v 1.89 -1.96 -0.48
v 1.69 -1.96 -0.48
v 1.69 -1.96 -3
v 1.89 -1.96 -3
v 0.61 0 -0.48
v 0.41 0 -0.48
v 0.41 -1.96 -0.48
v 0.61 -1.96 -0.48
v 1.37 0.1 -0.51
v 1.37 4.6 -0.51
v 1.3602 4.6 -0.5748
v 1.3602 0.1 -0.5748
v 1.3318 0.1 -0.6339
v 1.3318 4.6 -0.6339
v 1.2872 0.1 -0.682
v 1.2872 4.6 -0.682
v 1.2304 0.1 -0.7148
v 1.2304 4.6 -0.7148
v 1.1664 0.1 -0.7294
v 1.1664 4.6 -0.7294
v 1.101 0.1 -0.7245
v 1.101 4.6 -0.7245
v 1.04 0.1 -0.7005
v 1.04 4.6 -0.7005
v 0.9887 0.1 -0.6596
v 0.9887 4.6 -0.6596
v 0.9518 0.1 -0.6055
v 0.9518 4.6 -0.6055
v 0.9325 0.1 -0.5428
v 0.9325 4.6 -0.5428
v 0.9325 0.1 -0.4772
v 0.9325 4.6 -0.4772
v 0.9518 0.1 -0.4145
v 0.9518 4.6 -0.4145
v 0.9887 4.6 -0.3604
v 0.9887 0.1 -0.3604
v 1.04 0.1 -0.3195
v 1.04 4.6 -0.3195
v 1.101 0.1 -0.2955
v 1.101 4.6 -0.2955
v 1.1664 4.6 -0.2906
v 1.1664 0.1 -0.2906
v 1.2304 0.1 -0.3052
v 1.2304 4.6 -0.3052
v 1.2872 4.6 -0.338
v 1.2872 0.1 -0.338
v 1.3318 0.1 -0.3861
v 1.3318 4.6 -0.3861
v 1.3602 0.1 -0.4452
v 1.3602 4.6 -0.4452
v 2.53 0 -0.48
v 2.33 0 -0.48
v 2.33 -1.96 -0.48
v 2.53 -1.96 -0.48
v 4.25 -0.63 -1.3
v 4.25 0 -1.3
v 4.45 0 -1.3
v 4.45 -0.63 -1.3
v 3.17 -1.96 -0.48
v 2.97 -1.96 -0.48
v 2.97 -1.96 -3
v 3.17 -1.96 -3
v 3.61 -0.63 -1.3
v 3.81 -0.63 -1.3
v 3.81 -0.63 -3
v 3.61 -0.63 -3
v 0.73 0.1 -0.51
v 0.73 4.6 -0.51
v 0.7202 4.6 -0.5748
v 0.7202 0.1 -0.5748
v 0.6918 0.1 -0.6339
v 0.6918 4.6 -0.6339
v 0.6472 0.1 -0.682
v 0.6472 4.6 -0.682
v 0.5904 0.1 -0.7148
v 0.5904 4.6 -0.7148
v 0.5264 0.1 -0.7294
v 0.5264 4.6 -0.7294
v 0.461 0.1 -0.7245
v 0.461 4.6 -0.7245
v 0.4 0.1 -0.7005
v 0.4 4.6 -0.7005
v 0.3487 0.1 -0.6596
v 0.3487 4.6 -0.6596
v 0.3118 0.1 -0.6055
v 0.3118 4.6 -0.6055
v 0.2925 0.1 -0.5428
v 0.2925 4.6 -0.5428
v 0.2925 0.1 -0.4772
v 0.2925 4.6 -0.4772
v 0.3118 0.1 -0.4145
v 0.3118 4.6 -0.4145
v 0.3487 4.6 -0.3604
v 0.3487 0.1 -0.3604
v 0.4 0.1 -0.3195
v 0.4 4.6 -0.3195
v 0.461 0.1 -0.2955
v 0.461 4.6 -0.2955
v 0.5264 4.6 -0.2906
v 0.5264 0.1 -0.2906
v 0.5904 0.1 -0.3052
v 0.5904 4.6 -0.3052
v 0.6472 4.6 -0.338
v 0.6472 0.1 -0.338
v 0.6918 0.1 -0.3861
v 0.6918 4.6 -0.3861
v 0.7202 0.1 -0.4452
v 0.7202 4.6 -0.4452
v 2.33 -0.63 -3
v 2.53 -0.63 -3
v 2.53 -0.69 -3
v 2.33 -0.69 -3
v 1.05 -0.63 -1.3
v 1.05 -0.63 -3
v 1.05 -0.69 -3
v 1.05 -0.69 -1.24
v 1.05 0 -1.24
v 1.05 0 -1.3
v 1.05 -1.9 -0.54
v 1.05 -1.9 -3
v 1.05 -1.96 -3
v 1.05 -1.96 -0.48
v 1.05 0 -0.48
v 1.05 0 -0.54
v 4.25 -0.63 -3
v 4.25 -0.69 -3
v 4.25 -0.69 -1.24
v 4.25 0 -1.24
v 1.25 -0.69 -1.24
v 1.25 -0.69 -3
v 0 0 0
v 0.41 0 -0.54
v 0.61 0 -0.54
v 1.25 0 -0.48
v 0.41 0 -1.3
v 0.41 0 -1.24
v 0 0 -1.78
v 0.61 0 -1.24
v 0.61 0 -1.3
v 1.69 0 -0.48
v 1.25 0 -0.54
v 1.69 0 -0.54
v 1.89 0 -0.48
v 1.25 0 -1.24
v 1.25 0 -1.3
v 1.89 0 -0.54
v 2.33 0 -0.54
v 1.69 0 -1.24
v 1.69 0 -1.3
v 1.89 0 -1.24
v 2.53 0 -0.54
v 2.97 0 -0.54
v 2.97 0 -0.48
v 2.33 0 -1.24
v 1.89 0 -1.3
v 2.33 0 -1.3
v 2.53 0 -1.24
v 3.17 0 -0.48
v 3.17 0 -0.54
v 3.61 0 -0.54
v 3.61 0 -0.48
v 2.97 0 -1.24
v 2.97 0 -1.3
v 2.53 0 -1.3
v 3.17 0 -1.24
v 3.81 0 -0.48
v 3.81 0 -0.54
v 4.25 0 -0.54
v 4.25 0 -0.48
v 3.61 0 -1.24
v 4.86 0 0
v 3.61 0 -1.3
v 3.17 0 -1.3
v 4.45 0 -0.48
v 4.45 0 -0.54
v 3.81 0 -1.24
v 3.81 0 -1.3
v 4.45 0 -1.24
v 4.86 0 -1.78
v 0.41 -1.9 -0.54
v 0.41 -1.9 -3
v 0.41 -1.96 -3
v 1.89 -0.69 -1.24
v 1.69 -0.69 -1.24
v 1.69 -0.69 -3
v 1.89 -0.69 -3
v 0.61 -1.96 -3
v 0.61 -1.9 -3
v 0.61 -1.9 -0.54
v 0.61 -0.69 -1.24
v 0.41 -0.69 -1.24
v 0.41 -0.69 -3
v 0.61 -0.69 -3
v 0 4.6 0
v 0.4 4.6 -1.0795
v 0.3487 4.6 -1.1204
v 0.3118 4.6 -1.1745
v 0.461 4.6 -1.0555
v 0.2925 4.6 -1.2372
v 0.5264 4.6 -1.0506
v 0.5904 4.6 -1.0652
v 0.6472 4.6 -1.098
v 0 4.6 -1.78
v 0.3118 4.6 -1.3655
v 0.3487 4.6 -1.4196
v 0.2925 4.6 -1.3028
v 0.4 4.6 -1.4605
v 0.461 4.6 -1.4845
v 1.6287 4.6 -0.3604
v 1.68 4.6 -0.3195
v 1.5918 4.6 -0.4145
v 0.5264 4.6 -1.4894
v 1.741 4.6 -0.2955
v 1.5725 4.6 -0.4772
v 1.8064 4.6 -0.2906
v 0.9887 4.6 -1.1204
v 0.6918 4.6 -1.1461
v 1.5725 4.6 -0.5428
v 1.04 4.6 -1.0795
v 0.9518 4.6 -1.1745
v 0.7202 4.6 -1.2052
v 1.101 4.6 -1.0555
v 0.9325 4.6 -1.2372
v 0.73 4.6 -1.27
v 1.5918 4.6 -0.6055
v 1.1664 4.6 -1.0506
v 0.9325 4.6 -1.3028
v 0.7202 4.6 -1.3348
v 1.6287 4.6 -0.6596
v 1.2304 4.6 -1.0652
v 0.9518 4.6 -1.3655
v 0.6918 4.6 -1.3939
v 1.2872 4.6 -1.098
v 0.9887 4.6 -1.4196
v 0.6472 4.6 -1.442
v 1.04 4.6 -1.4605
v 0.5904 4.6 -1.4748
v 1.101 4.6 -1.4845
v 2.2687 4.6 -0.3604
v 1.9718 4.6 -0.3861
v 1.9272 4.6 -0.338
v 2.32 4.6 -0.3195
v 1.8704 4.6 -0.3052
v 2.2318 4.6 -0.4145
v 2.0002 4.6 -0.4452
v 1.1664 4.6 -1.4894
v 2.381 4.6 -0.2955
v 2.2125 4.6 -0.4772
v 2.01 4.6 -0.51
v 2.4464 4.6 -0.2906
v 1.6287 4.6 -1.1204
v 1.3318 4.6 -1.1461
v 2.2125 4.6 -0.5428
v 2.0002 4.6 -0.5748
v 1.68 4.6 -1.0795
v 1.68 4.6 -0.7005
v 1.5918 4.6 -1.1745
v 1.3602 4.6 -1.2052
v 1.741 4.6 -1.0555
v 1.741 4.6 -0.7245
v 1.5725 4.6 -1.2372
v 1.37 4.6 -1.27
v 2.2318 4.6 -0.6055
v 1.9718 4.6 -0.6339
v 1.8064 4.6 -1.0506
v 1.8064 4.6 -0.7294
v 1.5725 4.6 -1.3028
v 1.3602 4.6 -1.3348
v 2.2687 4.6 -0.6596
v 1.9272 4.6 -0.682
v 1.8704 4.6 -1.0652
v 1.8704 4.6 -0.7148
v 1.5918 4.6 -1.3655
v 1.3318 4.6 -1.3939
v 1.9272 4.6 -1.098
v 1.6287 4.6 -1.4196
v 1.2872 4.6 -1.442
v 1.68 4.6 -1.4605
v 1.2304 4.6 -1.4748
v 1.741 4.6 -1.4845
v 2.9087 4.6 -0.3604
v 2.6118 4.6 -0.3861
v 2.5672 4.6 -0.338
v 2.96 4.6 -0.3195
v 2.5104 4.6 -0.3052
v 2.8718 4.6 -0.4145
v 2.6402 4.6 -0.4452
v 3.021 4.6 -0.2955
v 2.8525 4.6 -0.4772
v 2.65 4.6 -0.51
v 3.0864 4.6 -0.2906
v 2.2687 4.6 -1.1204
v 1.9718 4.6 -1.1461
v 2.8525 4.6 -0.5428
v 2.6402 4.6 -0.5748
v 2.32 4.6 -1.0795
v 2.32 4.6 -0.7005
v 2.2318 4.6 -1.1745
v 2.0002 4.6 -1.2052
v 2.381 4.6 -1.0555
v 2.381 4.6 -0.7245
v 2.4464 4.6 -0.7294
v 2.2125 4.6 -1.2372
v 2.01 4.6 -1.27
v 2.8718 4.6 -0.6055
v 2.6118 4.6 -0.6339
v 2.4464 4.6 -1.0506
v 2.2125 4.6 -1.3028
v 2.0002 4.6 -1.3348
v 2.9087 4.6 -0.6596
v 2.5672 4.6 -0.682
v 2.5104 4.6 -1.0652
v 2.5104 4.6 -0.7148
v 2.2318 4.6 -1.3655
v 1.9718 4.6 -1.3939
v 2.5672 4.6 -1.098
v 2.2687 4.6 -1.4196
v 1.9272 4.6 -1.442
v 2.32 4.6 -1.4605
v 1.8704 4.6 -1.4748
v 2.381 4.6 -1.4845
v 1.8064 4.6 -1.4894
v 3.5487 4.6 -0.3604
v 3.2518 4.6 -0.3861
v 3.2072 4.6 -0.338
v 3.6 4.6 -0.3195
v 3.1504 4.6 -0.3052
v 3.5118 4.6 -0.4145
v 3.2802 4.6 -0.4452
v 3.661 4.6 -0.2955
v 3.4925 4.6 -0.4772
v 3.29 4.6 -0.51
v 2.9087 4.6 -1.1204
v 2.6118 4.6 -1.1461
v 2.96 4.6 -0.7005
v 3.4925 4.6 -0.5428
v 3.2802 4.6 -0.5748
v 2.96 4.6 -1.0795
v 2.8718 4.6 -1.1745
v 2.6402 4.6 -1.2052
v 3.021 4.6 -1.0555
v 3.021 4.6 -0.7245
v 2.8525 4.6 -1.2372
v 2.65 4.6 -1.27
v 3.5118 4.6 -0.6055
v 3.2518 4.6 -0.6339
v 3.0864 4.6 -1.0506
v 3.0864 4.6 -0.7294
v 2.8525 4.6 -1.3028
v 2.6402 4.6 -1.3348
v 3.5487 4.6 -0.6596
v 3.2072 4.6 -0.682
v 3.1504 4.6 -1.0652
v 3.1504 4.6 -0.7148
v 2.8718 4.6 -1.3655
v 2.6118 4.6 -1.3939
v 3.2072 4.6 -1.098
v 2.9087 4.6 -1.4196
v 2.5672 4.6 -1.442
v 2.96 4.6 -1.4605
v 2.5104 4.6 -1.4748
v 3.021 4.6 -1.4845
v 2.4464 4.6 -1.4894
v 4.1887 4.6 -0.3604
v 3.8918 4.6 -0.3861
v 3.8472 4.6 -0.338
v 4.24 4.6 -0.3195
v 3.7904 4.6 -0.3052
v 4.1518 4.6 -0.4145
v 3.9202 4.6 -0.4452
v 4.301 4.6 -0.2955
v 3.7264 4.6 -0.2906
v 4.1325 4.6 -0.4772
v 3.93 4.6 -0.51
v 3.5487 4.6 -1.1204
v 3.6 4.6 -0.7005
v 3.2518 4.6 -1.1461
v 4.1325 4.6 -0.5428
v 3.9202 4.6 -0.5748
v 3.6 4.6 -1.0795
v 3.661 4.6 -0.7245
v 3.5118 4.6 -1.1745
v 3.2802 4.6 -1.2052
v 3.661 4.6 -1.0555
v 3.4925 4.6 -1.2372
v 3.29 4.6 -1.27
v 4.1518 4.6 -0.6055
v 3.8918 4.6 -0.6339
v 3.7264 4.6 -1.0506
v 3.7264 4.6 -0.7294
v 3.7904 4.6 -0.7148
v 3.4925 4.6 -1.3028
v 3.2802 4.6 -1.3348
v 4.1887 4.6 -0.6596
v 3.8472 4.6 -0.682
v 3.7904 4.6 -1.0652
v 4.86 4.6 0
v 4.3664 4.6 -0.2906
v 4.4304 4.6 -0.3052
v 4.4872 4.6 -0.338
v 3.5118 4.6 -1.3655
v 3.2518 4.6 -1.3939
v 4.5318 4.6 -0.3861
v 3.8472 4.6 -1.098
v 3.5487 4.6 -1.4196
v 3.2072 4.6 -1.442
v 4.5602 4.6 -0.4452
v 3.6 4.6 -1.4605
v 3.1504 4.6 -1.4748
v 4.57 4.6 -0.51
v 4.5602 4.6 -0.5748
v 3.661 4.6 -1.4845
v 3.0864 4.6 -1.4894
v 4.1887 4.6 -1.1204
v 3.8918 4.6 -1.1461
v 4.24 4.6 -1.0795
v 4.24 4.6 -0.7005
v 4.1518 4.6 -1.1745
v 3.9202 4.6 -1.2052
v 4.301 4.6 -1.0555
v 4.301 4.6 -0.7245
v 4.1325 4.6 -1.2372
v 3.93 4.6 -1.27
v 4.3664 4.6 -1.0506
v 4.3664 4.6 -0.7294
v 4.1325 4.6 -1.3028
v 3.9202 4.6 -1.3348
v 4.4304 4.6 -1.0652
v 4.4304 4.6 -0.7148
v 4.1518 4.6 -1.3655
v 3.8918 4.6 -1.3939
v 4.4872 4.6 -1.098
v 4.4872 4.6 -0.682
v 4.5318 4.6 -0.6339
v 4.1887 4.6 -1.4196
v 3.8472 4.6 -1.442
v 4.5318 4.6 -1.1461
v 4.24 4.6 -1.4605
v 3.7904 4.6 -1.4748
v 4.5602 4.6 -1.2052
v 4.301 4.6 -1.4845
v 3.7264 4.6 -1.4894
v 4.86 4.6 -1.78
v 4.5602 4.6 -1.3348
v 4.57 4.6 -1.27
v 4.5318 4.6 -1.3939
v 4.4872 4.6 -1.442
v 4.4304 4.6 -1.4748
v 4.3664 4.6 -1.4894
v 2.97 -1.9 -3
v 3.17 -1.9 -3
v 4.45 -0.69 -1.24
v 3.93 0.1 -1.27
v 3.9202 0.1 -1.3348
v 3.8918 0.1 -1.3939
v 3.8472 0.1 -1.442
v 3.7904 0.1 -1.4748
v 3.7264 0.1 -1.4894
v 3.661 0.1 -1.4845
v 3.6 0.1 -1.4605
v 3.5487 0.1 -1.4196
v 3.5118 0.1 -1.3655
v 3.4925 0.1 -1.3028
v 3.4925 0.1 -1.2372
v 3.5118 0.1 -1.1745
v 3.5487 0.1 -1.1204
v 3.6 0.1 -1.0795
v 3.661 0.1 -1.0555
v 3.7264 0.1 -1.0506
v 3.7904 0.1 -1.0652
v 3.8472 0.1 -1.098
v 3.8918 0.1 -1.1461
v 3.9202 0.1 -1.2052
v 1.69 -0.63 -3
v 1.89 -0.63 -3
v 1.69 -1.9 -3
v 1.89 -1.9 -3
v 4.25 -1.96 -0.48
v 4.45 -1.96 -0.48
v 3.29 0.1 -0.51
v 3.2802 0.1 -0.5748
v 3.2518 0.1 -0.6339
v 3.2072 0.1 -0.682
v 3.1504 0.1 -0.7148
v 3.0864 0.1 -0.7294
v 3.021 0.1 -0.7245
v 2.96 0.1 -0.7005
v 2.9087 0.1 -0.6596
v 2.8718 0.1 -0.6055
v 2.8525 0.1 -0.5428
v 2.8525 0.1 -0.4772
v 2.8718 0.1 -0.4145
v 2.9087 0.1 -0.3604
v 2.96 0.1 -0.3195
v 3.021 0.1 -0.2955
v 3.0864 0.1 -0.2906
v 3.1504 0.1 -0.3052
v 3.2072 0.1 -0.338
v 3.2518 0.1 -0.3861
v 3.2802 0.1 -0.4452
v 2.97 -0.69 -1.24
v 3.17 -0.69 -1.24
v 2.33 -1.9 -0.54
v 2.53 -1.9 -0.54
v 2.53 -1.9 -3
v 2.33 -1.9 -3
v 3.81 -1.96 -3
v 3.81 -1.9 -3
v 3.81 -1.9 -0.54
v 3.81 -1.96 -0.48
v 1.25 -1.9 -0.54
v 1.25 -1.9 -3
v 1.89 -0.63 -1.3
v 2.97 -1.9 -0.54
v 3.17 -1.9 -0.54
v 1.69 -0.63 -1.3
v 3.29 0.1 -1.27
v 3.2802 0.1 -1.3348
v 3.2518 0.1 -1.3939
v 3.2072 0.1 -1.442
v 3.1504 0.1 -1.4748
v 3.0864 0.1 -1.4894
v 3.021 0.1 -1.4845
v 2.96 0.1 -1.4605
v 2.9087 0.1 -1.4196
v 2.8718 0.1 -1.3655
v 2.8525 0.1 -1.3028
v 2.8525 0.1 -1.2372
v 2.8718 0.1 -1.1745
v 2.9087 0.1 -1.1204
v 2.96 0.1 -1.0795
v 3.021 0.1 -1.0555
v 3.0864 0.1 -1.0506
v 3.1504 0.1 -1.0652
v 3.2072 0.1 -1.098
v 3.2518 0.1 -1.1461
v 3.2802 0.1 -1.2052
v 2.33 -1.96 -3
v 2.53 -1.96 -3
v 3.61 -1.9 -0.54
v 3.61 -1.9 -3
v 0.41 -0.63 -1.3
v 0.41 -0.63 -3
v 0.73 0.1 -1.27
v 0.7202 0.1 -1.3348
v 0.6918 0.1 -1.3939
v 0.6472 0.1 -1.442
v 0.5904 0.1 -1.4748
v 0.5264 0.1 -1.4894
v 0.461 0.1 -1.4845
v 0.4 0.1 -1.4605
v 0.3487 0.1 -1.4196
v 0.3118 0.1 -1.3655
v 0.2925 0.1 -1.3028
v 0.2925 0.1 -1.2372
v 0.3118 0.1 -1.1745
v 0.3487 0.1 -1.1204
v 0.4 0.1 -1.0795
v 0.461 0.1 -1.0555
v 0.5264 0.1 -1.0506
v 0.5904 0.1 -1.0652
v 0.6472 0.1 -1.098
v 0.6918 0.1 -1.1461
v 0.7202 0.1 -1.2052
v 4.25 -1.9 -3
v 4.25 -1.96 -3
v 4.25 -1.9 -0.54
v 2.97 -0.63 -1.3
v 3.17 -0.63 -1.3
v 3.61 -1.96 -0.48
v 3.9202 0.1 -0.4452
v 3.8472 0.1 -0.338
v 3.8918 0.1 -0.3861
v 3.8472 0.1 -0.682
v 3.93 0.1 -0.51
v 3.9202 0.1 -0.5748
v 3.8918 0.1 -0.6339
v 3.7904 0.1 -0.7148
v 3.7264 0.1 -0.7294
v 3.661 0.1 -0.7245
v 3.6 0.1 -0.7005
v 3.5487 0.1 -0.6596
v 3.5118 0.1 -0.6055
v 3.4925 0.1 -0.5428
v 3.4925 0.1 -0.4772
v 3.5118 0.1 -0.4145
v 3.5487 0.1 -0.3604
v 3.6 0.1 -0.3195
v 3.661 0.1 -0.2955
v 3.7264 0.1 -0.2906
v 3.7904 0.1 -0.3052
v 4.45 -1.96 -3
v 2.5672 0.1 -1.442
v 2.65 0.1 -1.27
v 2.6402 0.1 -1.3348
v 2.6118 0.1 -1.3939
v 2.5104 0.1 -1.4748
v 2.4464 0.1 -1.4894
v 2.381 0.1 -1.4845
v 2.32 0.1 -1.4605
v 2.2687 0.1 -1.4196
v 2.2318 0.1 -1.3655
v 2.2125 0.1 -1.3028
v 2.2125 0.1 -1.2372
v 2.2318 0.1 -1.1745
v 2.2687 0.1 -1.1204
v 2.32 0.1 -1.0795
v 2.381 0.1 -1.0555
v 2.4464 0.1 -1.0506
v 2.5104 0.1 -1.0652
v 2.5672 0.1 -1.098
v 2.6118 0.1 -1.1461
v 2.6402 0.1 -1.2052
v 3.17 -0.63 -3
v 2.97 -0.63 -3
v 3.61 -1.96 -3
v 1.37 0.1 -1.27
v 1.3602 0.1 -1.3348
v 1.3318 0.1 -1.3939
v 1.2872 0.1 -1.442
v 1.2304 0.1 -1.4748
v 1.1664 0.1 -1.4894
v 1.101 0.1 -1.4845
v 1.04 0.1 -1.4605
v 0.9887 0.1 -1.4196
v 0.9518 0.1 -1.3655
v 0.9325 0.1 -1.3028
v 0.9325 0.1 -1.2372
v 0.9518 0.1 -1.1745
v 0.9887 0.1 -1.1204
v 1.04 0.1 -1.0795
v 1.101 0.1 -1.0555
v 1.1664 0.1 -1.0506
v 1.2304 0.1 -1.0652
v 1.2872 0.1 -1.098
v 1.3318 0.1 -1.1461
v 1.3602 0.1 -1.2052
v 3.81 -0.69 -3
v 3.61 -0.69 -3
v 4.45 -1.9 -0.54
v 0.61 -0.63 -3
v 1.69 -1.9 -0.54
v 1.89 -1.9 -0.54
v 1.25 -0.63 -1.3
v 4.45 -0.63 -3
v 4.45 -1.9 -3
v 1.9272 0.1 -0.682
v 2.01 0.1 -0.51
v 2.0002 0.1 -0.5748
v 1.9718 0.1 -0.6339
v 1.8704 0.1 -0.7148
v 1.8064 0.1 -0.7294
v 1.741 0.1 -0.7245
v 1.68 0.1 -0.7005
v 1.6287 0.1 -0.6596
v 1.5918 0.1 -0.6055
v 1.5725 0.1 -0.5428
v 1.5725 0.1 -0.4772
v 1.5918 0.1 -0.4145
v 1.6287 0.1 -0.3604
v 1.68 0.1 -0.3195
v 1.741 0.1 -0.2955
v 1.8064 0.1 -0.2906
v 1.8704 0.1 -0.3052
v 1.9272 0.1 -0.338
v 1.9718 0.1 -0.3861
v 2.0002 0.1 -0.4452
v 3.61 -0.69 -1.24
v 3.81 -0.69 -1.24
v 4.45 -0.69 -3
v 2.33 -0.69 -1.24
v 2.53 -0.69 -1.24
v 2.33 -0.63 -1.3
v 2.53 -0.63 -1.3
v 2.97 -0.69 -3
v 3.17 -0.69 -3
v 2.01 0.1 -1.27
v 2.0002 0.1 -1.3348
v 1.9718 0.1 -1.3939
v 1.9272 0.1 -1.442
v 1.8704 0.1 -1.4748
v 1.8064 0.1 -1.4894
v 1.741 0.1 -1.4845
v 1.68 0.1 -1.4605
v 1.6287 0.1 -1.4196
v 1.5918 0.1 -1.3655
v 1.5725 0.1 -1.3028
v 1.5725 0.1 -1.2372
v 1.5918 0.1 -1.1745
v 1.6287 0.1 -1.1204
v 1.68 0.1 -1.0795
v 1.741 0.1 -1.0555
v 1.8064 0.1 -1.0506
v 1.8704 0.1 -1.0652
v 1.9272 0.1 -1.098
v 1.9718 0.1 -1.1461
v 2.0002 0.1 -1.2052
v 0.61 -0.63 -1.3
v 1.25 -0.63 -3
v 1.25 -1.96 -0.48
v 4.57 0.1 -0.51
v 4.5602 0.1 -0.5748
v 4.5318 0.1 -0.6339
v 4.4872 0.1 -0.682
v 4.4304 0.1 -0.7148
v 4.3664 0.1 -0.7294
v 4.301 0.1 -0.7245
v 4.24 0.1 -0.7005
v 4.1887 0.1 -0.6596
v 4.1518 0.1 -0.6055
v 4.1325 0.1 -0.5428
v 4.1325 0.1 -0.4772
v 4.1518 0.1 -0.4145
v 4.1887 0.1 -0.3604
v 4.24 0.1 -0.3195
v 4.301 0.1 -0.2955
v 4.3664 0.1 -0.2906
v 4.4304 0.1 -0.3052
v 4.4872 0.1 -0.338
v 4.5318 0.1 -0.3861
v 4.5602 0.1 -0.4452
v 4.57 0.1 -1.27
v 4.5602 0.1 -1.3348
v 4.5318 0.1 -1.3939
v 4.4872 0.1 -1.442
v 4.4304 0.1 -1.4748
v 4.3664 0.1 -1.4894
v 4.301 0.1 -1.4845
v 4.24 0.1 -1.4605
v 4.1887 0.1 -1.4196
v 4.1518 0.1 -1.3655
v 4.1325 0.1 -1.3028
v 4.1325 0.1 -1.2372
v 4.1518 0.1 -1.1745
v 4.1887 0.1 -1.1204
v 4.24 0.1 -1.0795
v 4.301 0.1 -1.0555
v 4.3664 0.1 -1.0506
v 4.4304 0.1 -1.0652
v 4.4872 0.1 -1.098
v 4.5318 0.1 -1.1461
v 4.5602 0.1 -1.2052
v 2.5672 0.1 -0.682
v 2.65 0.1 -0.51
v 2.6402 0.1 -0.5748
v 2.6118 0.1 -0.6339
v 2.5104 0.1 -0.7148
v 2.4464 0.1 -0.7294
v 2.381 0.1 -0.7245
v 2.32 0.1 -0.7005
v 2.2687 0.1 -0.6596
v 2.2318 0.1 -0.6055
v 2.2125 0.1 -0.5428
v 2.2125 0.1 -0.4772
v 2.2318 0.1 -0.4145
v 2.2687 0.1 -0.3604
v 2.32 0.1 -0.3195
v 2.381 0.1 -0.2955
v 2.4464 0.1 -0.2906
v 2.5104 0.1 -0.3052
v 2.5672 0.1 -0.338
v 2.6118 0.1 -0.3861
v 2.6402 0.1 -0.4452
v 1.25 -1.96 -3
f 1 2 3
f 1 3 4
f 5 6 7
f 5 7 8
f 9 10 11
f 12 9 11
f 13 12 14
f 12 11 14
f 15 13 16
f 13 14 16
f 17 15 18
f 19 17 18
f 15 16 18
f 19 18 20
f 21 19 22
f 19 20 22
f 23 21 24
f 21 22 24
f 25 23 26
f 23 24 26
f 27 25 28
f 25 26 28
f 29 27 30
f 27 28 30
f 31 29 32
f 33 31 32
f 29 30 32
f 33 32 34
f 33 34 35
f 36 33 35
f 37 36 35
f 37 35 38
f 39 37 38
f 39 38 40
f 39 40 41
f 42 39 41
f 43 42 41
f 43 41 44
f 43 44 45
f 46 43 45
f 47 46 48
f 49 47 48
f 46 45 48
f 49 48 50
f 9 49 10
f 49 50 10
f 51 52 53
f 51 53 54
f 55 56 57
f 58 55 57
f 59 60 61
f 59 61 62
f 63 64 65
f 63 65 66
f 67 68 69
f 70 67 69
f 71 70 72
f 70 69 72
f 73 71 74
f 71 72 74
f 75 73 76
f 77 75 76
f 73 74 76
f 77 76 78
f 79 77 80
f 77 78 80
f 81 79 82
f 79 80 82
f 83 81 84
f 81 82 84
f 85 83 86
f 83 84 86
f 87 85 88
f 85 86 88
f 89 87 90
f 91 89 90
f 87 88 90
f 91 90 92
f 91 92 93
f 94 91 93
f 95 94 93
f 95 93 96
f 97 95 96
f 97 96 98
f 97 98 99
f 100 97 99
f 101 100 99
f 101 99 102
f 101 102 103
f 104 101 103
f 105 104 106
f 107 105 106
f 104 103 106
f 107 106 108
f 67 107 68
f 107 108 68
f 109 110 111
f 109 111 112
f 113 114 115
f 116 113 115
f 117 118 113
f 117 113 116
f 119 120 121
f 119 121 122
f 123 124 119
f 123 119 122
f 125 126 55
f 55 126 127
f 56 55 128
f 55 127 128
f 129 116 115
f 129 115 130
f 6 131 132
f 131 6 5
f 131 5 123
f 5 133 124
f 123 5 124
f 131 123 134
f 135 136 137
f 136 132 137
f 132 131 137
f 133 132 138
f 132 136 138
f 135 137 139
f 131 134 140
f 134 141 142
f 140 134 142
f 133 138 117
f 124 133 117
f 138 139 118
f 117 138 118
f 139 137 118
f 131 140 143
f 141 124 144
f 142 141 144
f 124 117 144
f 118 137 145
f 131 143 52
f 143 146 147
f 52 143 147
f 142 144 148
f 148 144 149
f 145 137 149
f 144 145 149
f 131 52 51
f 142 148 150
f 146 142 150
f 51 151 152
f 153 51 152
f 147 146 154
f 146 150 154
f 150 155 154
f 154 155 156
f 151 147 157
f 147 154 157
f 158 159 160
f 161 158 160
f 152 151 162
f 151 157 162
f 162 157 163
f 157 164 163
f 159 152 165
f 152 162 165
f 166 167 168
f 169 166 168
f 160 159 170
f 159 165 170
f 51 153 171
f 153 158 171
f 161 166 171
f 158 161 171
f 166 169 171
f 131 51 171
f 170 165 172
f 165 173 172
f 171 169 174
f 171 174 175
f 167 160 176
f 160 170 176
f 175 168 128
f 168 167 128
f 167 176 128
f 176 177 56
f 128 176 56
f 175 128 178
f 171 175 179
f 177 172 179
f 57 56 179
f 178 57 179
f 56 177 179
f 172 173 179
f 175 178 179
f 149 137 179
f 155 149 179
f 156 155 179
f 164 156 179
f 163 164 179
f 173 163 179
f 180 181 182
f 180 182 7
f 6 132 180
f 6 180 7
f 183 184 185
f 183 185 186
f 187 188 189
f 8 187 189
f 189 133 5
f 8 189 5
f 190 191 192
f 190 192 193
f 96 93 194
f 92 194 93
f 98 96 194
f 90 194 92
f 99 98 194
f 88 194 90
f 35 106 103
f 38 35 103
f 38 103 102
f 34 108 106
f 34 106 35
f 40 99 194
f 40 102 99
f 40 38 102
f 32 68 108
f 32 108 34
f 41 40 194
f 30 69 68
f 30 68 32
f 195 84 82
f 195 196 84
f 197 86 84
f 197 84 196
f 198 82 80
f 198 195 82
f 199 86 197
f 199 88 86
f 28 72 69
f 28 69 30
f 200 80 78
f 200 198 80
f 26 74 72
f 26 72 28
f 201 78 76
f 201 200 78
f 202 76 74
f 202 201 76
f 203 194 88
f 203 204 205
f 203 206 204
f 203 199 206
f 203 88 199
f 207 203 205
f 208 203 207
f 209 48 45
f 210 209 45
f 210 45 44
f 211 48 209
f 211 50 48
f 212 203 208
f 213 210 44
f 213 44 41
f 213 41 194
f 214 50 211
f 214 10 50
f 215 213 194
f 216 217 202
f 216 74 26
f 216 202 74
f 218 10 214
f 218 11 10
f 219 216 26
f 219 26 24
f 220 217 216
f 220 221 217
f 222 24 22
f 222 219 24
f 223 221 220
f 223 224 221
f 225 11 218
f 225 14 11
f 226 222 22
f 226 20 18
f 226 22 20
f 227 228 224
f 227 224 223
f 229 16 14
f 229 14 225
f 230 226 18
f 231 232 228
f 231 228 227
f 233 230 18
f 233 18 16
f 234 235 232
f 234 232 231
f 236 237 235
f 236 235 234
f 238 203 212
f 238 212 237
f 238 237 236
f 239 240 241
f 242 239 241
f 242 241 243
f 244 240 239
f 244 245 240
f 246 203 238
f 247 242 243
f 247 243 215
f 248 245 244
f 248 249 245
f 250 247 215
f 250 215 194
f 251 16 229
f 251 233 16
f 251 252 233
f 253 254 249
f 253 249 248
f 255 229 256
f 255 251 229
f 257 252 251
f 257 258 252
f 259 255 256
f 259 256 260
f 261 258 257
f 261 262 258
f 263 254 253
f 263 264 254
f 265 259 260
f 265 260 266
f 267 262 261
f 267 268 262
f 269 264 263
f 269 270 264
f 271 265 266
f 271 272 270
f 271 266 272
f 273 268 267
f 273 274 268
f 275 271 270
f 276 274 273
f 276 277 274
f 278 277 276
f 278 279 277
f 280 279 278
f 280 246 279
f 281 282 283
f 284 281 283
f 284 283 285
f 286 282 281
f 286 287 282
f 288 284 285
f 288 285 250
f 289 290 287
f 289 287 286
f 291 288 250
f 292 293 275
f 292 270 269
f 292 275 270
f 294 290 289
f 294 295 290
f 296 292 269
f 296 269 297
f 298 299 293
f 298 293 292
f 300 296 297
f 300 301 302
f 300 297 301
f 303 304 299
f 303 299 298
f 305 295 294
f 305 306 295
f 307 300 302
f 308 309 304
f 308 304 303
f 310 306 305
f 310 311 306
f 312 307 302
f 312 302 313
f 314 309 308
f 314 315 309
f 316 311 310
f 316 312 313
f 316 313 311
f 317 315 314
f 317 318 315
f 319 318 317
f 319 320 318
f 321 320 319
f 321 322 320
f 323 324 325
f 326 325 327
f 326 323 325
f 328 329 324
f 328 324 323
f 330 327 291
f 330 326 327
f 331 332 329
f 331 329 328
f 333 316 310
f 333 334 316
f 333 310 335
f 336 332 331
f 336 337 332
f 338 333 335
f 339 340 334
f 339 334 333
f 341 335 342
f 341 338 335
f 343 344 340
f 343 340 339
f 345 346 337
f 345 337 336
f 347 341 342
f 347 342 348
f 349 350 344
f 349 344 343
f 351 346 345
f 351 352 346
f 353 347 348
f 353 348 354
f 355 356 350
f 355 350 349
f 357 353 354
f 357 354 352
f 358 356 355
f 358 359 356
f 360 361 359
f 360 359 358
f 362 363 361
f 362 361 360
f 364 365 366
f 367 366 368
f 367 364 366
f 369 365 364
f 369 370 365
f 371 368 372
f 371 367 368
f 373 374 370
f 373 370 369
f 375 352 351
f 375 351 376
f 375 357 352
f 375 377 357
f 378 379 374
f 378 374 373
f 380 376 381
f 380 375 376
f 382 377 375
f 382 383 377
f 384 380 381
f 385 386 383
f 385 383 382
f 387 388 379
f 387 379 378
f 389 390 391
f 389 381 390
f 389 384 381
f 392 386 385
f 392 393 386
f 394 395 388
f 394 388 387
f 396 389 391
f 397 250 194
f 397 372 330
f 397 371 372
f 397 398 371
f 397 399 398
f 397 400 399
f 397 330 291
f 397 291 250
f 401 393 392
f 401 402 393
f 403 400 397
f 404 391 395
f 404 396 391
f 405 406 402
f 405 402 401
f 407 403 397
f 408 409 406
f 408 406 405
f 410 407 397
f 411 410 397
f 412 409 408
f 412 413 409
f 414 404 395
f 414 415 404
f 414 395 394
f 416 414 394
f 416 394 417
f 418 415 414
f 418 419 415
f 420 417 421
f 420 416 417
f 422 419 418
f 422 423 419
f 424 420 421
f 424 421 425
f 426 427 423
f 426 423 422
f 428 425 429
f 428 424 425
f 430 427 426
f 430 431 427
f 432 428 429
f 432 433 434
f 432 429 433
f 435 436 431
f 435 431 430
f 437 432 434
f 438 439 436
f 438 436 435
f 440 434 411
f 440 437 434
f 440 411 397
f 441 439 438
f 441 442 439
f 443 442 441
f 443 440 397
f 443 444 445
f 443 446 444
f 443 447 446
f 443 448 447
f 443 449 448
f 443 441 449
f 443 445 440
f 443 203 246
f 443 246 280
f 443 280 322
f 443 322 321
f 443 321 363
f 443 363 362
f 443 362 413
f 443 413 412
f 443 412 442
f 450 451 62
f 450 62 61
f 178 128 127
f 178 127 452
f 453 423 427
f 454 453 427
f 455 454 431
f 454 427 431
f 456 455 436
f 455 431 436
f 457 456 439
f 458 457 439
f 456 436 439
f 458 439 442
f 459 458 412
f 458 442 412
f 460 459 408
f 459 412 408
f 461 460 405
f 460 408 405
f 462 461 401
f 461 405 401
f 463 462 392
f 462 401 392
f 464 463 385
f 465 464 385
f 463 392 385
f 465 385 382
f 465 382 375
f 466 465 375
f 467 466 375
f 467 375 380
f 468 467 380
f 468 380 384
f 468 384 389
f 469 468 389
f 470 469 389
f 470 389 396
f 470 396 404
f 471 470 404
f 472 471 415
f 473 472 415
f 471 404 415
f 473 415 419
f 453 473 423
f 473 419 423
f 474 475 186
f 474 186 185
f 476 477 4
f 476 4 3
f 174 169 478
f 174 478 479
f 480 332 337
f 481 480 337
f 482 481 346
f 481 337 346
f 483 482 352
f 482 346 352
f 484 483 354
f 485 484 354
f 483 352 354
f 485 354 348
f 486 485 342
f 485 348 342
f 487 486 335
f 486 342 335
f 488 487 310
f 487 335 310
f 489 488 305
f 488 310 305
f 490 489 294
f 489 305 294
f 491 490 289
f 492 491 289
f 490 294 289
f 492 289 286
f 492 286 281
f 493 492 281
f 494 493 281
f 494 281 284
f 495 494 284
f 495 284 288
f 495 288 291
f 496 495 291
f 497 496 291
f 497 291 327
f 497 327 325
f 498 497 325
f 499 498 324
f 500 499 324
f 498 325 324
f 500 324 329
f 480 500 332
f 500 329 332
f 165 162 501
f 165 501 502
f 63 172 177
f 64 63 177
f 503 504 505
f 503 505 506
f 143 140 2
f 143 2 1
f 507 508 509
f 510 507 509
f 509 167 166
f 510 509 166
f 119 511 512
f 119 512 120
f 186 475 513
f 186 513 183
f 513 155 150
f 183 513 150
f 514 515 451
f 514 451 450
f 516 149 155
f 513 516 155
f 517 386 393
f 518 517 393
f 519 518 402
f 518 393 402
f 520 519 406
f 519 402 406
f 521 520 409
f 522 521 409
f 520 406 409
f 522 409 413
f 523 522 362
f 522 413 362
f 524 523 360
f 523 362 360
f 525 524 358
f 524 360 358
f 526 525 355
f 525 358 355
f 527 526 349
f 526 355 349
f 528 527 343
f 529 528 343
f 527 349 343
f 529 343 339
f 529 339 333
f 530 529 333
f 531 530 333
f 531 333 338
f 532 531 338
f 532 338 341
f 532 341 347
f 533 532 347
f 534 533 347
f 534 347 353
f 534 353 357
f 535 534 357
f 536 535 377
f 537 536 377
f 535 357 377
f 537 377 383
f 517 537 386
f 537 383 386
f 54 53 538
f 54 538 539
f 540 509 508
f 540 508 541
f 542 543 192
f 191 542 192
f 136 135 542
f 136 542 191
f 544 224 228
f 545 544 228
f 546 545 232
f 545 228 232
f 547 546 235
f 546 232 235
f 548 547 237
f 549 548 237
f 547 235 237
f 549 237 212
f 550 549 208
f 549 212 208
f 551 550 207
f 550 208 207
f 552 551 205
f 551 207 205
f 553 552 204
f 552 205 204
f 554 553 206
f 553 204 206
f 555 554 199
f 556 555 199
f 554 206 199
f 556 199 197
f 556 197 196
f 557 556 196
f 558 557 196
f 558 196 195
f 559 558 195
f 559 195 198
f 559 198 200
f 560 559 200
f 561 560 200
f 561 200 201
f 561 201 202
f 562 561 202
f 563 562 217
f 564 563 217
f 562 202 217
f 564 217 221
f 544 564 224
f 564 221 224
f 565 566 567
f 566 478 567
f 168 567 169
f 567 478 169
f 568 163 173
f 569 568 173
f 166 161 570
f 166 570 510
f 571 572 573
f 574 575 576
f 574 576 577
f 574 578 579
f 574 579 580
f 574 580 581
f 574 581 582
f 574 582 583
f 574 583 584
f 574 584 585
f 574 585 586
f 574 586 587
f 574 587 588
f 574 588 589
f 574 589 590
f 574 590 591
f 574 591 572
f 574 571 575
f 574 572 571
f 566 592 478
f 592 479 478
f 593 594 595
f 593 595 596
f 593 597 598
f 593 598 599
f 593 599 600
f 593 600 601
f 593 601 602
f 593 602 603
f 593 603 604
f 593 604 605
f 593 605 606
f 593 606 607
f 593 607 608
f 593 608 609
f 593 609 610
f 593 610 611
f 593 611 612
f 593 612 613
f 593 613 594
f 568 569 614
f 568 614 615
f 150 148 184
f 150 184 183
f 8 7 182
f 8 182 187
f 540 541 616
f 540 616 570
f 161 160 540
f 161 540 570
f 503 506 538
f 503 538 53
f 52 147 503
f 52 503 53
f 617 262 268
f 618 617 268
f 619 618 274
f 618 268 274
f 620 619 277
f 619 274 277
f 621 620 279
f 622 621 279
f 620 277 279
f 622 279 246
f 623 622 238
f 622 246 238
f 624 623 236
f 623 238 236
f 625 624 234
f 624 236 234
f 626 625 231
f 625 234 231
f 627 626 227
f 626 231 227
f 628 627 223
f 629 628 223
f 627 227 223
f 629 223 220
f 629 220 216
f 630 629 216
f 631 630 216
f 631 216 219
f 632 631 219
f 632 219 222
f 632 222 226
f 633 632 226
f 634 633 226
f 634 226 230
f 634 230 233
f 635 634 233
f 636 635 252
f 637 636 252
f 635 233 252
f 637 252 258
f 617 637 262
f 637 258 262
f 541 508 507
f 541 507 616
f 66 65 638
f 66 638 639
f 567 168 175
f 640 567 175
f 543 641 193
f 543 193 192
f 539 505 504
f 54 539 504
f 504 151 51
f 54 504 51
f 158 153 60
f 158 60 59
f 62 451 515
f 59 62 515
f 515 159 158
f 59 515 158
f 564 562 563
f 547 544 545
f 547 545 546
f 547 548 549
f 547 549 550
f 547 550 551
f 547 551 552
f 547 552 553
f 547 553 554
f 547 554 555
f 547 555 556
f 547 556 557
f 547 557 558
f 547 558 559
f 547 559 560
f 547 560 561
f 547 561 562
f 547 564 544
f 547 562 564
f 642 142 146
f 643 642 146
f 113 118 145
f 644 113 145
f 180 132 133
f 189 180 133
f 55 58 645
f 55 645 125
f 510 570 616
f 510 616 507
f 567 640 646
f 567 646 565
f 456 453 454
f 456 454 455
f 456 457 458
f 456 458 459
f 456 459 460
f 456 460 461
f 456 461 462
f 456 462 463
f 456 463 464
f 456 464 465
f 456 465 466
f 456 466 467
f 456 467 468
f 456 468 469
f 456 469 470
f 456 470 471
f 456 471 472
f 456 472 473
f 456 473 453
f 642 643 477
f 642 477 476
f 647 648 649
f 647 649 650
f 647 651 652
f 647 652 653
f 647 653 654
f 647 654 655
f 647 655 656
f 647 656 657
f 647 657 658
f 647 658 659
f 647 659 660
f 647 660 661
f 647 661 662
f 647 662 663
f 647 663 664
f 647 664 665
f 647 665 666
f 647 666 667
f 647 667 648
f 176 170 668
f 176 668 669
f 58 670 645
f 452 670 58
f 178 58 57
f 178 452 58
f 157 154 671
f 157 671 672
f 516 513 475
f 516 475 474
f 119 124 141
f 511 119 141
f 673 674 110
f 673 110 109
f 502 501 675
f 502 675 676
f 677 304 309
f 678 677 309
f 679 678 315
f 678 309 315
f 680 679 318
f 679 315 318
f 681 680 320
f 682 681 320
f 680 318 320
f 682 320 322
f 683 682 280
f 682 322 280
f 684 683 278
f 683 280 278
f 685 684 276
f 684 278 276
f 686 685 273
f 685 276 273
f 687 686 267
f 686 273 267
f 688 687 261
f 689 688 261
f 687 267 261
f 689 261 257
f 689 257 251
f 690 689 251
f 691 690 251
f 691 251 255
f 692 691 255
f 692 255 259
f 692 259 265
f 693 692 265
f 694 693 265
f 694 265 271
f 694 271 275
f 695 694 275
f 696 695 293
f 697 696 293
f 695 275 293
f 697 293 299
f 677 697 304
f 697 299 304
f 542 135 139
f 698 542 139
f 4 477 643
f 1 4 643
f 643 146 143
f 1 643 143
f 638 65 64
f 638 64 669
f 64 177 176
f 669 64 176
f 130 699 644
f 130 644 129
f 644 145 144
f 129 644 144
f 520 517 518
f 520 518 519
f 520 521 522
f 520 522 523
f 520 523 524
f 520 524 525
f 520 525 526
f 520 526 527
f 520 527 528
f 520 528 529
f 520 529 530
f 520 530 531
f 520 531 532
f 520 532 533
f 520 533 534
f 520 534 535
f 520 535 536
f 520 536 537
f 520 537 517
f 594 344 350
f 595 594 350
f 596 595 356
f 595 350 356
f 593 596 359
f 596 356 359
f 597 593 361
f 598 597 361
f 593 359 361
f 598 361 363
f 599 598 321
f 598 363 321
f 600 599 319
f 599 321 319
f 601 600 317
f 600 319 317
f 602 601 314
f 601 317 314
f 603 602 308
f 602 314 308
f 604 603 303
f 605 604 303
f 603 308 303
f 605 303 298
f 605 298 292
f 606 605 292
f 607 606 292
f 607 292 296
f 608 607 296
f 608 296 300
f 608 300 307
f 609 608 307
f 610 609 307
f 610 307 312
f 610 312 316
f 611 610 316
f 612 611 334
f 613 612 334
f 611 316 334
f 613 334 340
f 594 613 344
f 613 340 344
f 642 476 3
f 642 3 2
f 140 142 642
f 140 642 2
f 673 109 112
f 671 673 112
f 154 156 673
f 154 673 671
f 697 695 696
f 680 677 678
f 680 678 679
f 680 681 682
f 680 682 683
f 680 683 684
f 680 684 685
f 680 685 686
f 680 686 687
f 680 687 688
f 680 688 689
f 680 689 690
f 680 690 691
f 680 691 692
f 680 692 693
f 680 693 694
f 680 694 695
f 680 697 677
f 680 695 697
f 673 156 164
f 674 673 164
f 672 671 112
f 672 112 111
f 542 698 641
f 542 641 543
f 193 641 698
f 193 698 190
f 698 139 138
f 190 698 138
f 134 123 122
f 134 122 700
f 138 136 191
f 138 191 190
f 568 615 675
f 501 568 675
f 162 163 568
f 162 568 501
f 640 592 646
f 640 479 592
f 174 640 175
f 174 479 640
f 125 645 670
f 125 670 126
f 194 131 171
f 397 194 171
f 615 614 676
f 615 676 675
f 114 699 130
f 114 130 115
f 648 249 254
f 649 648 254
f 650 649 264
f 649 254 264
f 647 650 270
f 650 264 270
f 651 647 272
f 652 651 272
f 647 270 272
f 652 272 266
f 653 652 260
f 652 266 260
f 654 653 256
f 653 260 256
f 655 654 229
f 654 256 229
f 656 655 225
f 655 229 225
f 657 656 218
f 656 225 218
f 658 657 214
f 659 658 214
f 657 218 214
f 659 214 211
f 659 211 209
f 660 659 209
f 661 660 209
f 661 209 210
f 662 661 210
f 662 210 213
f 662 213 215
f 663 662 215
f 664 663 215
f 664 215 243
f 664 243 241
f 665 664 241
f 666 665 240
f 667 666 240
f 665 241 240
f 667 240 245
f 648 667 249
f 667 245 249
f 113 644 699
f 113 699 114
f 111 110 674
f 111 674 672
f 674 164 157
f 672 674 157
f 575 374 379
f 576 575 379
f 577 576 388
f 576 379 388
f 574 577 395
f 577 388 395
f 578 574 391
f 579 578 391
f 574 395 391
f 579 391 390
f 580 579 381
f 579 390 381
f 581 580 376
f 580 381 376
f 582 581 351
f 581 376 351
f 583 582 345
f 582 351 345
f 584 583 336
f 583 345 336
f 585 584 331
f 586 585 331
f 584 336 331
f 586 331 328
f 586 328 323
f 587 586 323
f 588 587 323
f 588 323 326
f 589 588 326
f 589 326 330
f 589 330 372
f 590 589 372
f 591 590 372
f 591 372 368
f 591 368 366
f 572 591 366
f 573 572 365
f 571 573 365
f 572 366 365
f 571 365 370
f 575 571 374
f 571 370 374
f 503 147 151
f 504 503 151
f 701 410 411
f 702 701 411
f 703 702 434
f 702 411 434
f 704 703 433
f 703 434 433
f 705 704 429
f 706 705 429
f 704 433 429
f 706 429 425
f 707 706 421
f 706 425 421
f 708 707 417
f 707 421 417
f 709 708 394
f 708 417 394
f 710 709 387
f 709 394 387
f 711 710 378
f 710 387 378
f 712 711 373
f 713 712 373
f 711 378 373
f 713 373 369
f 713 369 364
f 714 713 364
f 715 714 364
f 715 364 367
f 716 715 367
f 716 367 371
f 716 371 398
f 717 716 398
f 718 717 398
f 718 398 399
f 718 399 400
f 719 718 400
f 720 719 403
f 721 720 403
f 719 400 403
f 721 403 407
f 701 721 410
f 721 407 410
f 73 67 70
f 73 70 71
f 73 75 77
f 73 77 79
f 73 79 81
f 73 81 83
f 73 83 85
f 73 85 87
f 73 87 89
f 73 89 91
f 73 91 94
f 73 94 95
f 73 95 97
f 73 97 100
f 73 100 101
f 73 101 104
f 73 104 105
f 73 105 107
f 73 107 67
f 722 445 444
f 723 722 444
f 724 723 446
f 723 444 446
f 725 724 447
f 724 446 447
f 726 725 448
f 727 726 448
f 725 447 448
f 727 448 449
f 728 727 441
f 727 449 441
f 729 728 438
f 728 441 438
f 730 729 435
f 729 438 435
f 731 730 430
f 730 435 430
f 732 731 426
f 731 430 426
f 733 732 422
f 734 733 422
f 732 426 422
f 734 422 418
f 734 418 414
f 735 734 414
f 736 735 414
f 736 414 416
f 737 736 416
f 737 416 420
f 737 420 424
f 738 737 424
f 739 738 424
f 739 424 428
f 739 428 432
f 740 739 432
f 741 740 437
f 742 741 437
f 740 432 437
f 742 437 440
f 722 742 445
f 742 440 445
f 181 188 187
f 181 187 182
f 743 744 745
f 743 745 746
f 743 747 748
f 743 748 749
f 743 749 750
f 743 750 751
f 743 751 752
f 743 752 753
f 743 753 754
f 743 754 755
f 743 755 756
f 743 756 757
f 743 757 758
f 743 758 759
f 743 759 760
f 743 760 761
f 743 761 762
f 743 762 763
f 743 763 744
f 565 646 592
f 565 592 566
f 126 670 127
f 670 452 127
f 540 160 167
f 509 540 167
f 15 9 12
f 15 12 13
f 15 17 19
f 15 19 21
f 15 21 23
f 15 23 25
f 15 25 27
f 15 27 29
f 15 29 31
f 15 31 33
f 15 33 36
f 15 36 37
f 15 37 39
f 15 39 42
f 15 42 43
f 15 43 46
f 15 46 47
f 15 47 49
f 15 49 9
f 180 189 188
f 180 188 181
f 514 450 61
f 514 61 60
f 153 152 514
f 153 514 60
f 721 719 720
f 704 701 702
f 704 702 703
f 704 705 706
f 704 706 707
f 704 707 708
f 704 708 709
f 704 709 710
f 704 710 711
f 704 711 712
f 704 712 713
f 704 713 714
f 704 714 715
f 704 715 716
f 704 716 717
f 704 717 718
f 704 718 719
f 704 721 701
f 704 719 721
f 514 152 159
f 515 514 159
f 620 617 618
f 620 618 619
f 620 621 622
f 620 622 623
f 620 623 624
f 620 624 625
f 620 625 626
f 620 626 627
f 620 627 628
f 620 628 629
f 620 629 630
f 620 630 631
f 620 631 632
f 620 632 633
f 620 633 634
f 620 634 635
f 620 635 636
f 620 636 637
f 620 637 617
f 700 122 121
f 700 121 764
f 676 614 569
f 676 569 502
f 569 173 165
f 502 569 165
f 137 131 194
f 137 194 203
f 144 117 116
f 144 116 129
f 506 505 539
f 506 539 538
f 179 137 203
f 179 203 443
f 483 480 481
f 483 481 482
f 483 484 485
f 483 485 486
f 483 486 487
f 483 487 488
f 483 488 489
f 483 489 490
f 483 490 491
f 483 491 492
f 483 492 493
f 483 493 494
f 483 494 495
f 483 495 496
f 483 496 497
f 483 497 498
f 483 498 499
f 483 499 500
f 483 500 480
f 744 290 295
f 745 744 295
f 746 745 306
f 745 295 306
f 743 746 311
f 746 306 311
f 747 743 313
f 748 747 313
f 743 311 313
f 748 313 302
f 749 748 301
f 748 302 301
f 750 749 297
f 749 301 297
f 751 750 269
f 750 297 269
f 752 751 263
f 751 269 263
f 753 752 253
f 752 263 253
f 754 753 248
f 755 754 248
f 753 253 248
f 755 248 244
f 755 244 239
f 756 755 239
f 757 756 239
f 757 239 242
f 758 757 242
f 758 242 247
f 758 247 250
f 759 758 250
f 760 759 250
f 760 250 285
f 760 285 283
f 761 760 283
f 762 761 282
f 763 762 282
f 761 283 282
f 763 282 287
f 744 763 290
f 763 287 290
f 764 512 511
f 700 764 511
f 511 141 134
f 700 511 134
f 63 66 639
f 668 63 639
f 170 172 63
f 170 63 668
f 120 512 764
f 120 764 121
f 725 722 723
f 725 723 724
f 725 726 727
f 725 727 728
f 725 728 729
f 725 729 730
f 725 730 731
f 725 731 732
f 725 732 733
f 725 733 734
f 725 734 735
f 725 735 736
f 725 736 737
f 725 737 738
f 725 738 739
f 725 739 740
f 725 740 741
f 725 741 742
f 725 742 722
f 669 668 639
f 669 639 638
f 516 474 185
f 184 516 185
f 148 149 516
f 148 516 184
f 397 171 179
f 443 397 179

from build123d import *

# Parameters (mm, degrees)
SKETCH2_W           = 4.86
SKETCH2_H           = 1.78
BOSS_EXTRUDE1_DEPTH = 4.6
SKETCH3_R           = 0.22
CUT_EXTRUDE1_DEPTH  = 4.5
SKETCH4_W           = 0.2
SKETCH4_H           = 0.06
BOSS_EXTRUDE2_DEPTH = 1.96
SKETCH6_W           = 0.2
SKETCH6_H           = 0.06
BOSS_EXTRUDE3_DEPTH = 0.69
SKETCH7_W           = 0.2
SKETCH7_H           = 0.06
BOSS_EXTRUDE4_DEPTH = 1.7
SKETCH8_W           = 0.2
SKETCH8_H           = 0.06
BOSS_EXTRUDE5_DEPTH = 2.46


with BuildPart() as part:
    # Sketch2 → Boss-Extrude1 (new body)
    with BuildSketch(Plane(origin=(0, 0, 0), x_dir=(1, 0, 0), z_dir=(0, 1, 0))):
        with Locations((2.43, 0.89)):
            Rectangle(SKETCH2_W, SKETCH2_H)
    extrude(amount=BOSS_EXTRUDE1_DEPTH)

    # Sketch3 → Cut-Extrude1 (cut)
    with BuildSketch(Plane(origin=(0, 4.6, 0), x_dir=(1, 0, 0), z_dir=(0, 1, 0))):
        with Locations((0.51, 1.27)):
            Circle(SKETCH3_R)
        with Locations((1.15, 1.27)):
            Circle(SKETCH3_R)
        with Locations((1.79, 1.27)):
            Circle(SKETCH3_R)
        with Locations((2.43, 1.27)):
            Circle(SKETCH3_R)
        with Locations((3.07, 1.27)):
            Circle(SKETCH3_R)
        with Locations((3.71, 1.27)):
            Circle(SKETCH3_R)
        with Locations((4.35, 1.27)):
            Circle(SKETCH3_R)
        with Locations((1.15, 0.51)):
            Circle(SKETCH3_R)
        with Locations((1.79, 0.51)):
            Circle(SKETCH3_R)
        with Locations((2.43, 0.51)):
            Circle(SKETCH3_R)
        with Locations((3.07, 0.51)):
            Circle(SKETCH3_R)
        with Locations((3.71, 0.51)):
            Circle(SKETCH3_R)
        with Locations((4.35, 0.51)):
            Circle(SKETCH3_R)
        with Locations((0.51, 0.51)):
            Circle(SKETCH3_R)
    extrude(amount=-CUT_EXTRUDE1_DEPTH, mode=Mode.SUBTRACT)

    # Sketch4 → Boss-Extrude2 (add)
    with BuildSketch(Plane.XZ):
        with Locations((0.51, -0.51)):
            Rectangle(SKETCH4_W, SKETCH4_H)
        with Locations((1.15, -0.51)):
            Rectangle(SKETCH4_W, SKETCH4_H)
        with Locations((1.79, -0.51)):
            Rectangle(SKETCH4_W, SKETCH4_H)
        with Locations((2.43, -0.51)):
            Rectangle(SKETCH4_W, SKETCH4_H)
        with Locations((3.07, -0.51)):
            Rectangle(SKETCH4_W, SKETCH4_H)
        with Locations((3.71, -0.51)):
            Rectangle(SKETCH4_W, SKETCH4_H)
        with Locations((4.35, -0.51)):
            Rectangle(SKETCH4_W, SKETCH4_H)
    extrude(amount=BOSS_EXTRUDE2_DEPTH)

    # Sketch6 → Boss-Extrude3 (add)
    with BuildSketch(Plane.XZ):
        with Locations((0.51, -1.27)):
            Rectangle(SKETCH6_W, SKETCH6_H)
        with Locations((1.15, -1.27)):
            Rectangle(SKETCH6_W, SKETCH6_H)
        with Locations((1.79, -1.27)):
            Rectangle(SKETCH6_W, SKETCH6_H)
        with Locations((2.43, -1.27)):
            Rectangle(SKETCH6_W, SKETCH6_H)
        with Locations((3.07, -1.27)):
            Rectangle(SKETCH6_W, SKETCH6_H)
        with Locations((3.71, -1.27)):
            Rectangle(SKETCH6_W, SKETCH6_H)
        with Locations((4.35, -1.27)):
            Rectangle(SKETCH6_W, SKETCH6_H)
    extrude(amount=BOSS_EXTRUDE3_DEPTH)

    # Sketch7 → Boss-Extrude4 (add)
    with BuildSketch(Plane(origin=(0, 0, -1.3), x_dir=(-1, 0, 0), z_dir=(0, 0, -1))):
        with Locations((-4.35, -0.66)):
            Rectangle(SKETCH7_W, SKETCH7_H)
        with Locations((-3.71, -0.66)):
            Rectangle(SKETCH7_W, SKETCH7_H)
        with Locations((-3.07, -0.66)):
            Rectangle(SKETCH7_W, SKETCH7_H)
        with Locations((-2.43, -0.66)):
            Rectangle(SKETCH7_W, SKETCH7_H)
        with Locations((-1.79, -0.66)):
            Rectangle(SKETCH7_W, SKETCH7_H)
        with Locations((-1.15, -0.66)):
            Rectangle(SKETCH7_W, SKETCH7_H)
        with Locations((-0.51, -0.66)):
            Rectangle(SKETCH7_W, SKETCH7_H)
    extrude(amount=BOSS_EXTRUDE4_DEPTH)

    # Sketch8 → Boss-Extrude5 (add)
    with BuildSketch(Plane(origin=(0, 0, -0.54), x_dir=(-1, 0, 0), z_dir=(0, 0, -1))):
        with Locations((-4.35, -1.93)):
            Rectangle(SKETCH8_W, SKETCH8_H)
        with Locations((-3.71, -1.93)):
            Rectangle(SKETCH8_W, SKETCH8_H)
        with Locations((-3.07, -1.93)):
            Rectangle(SKETCH8_W, SKETCH8_H)
        with Locations((-2.43, -1.93)):
            Rectangle(SKETCH8_W, SKETCH8_H)
        with Locations((-1.79, -1.93)):
            Rectangle(SKETCH8_W, SKETCH8_H)
        with Locations((-1.15, -1.93)):
            Rectangle(SKETCH8_W, SKETCH8_H)
        with Locations((-0.51, -1.93)):
            Rectangle(SKETCH8_W, SKETCH8_H)
    extrude(amount=BOSS_EXTRUDE5_DEPTH)


solid = part.part
